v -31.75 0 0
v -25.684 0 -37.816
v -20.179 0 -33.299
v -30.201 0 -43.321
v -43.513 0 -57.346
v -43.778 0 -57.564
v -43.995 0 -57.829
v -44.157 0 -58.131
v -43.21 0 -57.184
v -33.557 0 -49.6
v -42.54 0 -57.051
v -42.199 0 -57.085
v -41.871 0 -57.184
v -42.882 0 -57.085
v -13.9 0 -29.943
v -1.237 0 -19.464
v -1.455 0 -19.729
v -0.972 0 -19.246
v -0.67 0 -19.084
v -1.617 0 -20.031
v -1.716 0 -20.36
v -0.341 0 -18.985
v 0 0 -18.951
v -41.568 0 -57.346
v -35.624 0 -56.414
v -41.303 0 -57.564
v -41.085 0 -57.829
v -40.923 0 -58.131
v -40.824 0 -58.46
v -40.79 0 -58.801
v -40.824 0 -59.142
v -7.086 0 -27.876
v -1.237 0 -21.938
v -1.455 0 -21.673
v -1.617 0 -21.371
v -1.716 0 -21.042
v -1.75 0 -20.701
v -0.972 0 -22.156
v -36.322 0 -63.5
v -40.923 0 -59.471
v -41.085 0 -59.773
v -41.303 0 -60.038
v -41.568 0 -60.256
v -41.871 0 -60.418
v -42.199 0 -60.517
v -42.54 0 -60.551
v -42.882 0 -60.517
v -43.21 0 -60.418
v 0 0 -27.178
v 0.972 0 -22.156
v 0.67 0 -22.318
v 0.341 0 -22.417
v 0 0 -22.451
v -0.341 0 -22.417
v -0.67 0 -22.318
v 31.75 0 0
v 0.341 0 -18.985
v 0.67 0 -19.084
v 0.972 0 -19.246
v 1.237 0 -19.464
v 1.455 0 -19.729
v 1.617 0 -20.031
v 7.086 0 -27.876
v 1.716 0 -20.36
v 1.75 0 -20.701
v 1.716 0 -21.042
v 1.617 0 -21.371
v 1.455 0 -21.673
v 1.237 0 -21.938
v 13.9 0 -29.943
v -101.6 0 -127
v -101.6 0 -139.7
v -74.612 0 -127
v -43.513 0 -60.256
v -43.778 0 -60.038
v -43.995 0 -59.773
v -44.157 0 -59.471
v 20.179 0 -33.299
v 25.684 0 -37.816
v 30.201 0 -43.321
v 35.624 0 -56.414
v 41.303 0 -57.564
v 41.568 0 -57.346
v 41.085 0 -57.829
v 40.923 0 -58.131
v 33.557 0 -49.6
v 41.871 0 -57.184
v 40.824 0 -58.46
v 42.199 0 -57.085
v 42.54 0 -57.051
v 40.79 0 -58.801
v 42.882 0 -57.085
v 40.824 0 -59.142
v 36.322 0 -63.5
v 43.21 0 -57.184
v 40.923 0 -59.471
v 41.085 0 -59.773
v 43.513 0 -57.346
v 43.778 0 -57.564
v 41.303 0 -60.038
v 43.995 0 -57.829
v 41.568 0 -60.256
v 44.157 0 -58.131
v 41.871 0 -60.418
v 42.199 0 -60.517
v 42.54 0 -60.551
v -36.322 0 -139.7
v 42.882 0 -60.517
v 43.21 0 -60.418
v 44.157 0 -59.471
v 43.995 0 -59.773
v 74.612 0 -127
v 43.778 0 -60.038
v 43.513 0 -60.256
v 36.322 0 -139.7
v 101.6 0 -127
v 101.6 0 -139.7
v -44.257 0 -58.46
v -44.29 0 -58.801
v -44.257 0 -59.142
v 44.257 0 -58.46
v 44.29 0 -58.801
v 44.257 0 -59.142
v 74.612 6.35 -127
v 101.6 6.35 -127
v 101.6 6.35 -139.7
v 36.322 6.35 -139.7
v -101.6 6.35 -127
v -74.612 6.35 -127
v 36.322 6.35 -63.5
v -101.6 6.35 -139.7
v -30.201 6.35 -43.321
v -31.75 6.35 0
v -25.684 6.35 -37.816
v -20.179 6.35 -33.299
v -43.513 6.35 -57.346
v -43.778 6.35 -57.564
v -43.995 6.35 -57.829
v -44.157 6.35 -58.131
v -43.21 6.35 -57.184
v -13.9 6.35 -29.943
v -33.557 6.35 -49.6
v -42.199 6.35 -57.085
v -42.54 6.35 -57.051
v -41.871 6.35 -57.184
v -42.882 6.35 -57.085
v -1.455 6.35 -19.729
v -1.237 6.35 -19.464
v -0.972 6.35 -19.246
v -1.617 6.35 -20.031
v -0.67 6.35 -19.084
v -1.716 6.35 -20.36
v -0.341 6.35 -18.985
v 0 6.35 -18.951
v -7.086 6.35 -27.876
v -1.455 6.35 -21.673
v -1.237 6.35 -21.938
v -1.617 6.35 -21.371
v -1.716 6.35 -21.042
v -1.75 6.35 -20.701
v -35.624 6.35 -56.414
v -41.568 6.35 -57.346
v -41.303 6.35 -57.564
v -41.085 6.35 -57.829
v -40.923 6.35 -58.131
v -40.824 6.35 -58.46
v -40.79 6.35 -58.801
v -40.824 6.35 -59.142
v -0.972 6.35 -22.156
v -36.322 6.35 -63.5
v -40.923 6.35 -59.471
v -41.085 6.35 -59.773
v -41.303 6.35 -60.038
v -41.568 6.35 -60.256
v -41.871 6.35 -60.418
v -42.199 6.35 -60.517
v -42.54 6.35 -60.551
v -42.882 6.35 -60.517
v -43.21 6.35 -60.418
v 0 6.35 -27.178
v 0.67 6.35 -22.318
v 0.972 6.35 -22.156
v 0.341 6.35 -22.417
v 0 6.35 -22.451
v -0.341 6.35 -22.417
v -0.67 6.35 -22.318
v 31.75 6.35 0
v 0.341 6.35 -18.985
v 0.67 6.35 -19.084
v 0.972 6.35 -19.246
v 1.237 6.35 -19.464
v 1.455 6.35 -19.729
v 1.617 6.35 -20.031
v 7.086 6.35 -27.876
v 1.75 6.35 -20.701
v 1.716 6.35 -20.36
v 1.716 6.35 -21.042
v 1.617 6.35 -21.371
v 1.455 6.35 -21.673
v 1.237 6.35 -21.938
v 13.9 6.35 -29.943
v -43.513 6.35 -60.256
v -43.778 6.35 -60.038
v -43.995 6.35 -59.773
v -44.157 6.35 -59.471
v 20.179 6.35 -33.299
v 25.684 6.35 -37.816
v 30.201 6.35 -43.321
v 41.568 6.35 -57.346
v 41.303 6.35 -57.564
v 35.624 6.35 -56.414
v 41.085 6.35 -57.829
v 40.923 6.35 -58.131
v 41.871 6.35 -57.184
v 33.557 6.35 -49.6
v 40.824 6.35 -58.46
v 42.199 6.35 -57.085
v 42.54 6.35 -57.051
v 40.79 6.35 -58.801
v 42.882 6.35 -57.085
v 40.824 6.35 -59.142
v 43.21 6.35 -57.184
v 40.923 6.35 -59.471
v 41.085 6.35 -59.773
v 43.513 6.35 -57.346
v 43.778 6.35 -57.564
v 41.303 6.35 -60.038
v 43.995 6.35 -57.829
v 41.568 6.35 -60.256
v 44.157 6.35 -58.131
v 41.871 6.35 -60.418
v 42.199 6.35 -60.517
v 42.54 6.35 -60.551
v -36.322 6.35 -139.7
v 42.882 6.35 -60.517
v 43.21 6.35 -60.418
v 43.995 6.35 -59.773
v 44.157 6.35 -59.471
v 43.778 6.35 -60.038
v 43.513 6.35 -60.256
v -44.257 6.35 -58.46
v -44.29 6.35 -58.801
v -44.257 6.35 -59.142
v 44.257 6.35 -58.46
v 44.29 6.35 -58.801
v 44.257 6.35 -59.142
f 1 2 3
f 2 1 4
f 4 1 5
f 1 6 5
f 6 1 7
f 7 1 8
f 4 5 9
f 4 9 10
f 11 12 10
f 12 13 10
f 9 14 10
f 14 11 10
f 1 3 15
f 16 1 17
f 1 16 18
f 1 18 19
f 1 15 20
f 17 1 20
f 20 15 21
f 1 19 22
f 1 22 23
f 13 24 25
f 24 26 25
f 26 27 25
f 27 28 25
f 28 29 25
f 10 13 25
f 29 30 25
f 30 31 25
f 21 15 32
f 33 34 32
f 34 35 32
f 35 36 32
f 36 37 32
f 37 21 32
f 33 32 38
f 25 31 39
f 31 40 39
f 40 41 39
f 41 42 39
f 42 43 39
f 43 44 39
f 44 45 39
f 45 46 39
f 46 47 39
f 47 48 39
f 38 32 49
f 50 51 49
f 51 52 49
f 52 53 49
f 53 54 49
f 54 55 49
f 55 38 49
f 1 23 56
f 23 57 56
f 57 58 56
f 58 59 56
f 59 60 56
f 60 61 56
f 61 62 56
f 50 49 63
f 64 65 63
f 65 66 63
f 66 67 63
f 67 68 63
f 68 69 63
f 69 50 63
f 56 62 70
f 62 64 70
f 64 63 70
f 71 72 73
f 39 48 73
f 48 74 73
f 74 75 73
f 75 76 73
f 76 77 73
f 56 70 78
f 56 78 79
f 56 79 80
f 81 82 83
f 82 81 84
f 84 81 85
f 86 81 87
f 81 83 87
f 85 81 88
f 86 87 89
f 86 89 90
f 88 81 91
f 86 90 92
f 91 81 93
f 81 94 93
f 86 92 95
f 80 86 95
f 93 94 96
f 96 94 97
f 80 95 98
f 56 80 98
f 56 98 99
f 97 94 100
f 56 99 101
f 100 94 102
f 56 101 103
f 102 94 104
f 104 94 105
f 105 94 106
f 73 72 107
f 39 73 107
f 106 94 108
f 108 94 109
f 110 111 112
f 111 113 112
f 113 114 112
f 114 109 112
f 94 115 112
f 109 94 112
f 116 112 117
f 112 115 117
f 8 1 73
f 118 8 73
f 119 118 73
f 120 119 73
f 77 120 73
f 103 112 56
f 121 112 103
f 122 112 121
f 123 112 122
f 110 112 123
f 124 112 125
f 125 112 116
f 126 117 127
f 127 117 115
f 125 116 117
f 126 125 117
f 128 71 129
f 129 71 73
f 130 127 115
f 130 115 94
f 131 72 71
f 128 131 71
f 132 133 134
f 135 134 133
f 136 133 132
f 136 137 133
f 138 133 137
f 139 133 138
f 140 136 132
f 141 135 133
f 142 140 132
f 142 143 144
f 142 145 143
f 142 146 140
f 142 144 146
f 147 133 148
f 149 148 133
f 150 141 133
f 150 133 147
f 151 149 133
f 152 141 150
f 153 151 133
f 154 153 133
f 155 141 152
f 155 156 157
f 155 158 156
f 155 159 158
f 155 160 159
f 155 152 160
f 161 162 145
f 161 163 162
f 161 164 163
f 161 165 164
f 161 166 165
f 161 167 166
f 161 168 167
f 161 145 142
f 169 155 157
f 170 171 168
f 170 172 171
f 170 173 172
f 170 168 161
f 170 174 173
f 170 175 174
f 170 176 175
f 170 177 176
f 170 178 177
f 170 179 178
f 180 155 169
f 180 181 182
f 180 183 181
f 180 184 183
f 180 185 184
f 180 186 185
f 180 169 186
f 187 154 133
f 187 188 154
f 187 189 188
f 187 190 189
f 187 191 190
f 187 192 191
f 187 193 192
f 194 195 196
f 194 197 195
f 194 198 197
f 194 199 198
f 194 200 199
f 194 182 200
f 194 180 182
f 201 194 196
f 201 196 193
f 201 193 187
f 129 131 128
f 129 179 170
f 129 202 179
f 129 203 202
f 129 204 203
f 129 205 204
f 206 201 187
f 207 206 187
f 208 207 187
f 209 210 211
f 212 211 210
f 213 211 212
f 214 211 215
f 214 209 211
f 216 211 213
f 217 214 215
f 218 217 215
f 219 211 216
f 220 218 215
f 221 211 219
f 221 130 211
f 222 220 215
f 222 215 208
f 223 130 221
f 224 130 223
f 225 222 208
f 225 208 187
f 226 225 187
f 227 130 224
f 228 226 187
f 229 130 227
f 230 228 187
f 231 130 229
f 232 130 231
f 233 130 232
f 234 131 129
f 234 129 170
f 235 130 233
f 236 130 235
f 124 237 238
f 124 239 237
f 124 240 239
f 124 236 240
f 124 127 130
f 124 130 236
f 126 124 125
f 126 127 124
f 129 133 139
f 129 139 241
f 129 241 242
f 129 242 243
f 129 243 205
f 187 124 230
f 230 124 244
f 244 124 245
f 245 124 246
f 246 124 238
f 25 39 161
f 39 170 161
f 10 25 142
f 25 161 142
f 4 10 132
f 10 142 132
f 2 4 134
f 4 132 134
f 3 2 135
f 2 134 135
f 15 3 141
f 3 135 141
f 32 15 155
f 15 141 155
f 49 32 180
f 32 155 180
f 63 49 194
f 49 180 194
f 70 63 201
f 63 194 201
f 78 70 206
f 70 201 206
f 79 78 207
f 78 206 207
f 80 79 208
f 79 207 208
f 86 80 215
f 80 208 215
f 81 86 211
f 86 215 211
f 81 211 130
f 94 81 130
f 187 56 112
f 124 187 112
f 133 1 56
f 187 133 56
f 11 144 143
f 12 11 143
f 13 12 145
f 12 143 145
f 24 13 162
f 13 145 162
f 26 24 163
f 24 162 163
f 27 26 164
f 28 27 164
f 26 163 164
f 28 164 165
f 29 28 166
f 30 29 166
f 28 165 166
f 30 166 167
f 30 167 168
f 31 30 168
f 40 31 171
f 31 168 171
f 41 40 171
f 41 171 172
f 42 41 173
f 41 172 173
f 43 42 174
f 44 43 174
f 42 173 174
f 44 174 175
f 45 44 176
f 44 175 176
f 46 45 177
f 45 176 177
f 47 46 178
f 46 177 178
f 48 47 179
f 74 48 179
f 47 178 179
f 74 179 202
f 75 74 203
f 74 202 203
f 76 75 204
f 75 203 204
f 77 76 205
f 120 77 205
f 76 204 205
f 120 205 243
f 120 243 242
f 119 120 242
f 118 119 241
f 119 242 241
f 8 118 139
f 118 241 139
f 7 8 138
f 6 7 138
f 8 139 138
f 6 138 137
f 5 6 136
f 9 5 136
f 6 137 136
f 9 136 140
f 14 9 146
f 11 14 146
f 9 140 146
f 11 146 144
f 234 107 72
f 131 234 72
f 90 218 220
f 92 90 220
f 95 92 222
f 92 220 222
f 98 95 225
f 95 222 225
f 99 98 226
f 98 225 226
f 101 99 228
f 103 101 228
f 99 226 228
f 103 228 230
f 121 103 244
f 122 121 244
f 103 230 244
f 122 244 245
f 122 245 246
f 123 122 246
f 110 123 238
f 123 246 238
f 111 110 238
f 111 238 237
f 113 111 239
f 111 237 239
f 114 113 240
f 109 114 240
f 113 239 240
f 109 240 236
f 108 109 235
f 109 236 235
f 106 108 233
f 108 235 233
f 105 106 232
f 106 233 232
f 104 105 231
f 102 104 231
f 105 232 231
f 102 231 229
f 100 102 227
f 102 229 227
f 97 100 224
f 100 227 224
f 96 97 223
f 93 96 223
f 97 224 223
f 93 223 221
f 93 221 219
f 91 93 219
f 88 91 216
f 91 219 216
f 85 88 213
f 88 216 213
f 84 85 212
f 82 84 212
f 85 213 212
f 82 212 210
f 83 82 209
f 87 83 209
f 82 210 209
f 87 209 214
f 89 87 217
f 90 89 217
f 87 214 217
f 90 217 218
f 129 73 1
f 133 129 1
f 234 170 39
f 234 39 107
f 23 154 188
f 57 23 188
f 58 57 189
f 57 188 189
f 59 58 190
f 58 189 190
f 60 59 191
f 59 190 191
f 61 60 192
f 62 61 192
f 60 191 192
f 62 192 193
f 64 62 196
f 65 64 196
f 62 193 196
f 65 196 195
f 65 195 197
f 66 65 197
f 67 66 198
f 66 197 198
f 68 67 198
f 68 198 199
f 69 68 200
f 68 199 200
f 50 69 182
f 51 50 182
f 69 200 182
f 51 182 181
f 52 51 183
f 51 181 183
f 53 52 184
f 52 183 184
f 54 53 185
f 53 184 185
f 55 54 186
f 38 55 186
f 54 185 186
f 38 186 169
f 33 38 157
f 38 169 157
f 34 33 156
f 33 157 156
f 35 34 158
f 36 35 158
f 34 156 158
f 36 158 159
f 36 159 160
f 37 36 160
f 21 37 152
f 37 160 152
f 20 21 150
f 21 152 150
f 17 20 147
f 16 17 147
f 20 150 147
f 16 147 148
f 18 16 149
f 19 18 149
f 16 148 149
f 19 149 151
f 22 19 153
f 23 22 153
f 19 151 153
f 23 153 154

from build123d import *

# Parameters (mm, degrees)
BOSS_EXTRU_1_DEPTH      = 6.35
ESQUISSE3_R             = 36.322
ENL_V_MAT_EXTRU_2_DEPTH = 173.855351378
ENL_V_MAT_EXTRU_5_DEPTH = 6.35
ESQUISSE7_R             = 1.75
ENL_V_MAT_EXTRU_6_DEPTH = 6.35


with BuildPart() as part:
    # Esquisse1 → Boss.-Extru.1 (new body)
    with BuildSketch(Plane(origin=(0, 0, 0), x_dir=(1, 0, 0), z_dir=(0, 1, 0))):
        Polygon((-101.6, 139.7), (-101.6, 127), (-74.6125, 127), (-31.75, 0), (31.75, 0), (74.6125, 127), (101.6, 127), (101.6, 139.7), align=None)
    extrude(amount=BOSS_EXTRU_1_DEPTH)

    # Esquisse3 → Enlèv. mat.-Extru.2 (cut, through all)
    with BuildSketch(Plane(origin=(0, 6.35, 0), x_dir=(1, 0, 0), z_dir=(0, 1, 0))):
        with Locations(Location((0, 63.5, 0), (0, 0, 270))):
            Circle(ESQUISSE3_R)
    extrude(amount=-ENL_V_MAT_EXTRU_2_DEPTH, mode=Mode.SUBTRACT)

    # Esquisse6 → Enlèv. mat.-Extru.5 (cut)
    with BuildSketch(Plane(origin=(0, 6.35, 0), x_dir=(1, 0, 0), z_dir=(0, 1, 0))):
        with BuildLine():
            Line((-36.322, 63.5), (-36.322, 139.7))
            Line((-36.322, 139.7), (36.322, 139.7))
            Line((36.322, 139.7), (36.322, 63.5))
            ThreePointArc((36.322, 63.5), (0, 99.822), (-36.322, 63.5))
        make_face()
    extrude(amount=-ENL_V_MAT_EXTRU_5_DEPTH, mode=Mode.SUBTRACT)

    # Esquisse7 → Enlèv. mat.-Extru.6 (cut)
    with BuildSketch(Plane(origin=(0, 6.35, 0), x_dir=(1, 0, 0), z_dir=(0, 1, 0))):
        with Locations(Location((0, 20.701, 0), (0, 0, 270))):
            Circle(ESQUISSE7_R)
        with Locations(Location((42.54026093, 58.801, 0), (0, 0, 270))):
            Circle(ESQUISSE7_R)
        with Locations(Location((-42.54026093, 58.801, 0), (0, 0, 270))):
            Circle(ESQUISSE7_R)
    extrude(amount=-ENL_V_MAT_EXTRU_6_DEPTH, mode=Mode.SUBTRACT)


solid = part.part
